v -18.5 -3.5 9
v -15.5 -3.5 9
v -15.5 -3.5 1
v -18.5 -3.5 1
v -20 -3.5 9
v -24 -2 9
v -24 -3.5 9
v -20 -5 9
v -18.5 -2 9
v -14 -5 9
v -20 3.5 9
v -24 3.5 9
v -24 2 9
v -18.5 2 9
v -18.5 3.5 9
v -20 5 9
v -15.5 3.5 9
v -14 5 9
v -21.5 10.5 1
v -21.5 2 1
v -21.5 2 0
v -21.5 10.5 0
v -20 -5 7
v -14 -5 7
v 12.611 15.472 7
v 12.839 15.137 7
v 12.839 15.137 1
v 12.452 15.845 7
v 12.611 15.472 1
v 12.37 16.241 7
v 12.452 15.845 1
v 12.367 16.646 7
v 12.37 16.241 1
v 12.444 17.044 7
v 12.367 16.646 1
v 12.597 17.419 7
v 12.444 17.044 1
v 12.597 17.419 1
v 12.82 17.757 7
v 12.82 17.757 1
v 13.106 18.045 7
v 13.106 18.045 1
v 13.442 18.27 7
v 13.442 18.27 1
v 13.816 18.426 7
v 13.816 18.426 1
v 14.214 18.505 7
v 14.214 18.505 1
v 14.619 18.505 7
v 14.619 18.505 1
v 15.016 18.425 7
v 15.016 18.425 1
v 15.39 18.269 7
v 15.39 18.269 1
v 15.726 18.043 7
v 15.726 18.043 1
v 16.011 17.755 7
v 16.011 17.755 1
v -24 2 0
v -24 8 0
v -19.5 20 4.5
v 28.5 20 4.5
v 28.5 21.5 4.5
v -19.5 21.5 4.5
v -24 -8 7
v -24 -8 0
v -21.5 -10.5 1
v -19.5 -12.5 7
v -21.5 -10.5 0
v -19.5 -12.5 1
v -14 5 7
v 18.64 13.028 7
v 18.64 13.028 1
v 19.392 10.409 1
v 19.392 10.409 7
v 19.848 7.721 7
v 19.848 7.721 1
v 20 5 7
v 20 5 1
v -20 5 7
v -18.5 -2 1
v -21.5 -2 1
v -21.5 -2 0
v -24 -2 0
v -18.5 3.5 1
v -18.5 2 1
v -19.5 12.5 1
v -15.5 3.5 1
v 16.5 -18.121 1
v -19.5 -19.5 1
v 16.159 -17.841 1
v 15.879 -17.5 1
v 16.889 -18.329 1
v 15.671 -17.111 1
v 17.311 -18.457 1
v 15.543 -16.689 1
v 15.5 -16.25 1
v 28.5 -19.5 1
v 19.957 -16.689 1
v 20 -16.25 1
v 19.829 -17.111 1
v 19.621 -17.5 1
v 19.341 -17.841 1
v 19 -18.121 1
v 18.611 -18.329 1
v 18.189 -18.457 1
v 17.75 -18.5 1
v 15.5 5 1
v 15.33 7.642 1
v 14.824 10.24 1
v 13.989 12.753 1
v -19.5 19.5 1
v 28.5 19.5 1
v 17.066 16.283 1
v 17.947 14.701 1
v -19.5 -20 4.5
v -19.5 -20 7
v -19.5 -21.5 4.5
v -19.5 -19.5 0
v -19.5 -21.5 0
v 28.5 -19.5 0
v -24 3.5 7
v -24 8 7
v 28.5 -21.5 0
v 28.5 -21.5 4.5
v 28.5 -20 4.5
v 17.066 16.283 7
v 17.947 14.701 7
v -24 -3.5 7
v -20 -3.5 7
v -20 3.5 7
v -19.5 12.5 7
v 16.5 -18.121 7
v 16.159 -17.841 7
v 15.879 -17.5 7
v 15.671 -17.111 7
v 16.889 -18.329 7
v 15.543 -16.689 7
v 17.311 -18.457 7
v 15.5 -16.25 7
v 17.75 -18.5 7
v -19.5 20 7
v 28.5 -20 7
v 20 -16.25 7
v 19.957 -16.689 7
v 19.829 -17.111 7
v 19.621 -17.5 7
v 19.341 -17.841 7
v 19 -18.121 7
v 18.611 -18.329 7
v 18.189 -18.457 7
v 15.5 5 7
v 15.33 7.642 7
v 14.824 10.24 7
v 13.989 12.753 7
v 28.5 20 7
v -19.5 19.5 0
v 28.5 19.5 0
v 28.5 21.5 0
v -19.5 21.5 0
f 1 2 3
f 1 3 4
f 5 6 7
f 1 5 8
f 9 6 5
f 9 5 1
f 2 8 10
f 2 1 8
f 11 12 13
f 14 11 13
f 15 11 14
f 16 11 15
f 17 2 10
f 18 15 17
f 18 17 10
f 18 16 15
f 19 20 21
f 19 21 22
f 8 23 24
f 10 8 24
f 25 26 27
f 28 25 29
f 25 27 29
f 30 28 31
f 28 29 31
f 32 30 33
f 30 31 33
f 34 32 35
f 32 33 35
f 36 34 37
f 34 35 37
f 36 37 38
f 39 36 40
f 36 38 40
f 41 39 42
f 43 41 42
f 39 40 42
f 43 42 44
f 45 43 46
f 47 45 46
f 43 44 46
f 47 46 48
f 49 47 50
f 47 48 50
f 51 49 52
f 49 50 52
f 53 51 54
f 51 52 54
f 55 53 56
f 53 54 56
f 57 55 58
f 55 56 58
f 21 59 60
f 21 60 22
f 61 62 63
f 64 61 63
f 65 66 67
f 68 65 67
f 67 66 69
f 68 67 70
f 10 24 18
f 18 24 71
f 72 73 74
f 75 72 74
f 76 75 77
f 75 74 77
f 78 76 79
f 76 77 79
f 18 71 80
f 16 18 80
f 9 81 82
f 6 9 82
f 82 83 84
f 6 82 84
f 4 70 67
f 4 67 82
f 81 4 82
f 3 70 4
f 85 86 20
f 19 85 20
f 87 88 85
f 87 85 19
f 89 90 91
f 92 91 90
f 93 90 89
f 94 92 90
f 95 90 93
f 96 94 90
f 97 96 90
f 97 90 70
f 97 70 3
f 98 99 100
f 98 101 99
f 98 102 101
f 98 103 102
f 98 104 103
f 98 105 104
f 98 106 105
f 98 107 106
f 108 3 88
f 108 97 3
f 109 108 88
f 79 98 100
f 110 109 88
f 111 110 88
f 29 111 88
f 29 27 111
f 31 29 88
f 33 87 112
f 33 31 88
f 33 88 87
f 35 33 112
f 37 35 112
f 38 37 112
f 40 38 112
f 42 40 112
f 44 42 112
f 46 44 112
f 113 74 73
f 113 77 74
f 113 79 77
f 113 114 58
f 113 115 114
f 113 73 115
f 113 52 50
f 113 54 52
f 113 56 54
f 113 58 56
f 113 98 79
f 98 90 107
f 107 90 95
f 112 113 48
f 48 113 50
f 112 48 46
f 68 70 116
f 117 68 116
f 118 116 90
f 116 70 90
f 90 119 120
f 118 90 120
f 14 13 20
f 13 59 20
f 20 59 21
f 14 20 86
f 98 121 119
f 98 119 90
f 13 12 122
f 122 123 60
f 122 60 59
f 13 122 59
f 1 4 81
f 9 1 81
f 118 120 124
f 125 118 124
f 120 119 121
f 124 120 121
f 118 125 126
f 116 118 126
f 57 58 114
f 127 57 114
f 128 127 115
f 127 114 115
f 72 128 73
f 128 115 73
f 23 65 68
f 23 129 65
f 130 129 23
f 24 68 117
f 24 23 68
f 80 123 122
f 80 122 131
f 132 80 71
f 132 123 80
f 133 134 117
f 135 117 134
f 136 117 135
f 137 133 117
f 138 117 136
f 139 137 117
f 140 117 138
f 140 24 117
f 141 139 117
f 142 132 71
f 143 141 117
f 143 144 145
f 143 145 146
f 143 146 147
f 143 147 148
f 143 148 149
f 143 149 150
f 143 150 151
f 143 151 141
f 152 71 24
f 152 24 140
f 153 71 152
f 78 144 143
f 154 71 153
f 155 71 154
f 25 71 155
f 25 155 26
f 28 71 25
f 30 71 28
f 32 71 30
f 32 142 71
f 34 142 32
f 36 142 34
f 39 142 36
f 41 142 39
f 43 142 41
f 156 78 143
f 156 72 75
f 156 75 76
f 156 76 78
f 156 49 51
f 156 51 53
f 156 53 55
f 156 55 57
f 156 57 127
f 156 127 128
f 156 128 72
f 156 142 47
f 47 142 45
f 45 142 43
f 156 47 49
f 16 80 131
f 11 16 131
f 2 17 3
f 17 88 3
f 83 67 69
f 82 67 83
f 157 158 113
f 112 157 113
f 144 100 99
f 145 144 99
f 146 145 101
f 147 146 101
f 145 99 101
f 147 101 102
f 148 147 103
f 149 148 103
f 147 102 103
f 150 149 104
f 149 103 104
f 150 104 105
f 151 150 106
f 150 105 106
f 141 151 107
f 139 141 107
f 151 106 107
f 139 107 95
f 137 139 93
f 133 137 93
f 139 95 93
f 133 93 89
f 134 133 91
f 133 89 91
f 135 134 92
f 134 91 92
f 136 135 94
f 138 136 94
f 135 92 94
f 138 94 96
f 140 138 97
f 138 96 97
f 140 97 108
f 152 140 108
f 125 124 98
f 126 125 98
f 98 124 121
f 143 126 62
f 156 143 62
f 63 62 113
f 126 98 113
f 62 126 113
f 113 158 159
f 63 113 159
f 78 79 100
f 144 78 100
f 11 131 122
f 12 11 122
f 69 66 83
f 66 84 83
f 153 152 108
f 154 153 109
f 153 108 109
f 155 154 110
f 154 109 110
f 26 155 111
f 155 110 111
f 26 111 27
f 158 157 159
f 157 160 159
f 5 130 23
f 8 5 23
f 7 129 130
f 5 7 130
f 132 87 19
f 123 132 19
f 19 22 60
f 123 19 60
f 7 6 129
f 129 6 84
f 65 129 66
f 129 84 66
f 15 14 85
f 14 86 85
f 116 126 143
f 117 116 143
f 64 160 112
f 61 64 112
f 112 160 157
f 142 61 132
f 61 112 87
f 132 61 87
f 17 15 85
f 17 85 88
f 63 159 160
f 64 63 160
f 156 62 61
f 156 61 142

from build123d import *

# Parameters (mm, degrees)
F1_DEPTH = 7
F2_W     = 39
F2_H     = 1
F3_DEPTH = 50
F5_DEPTH = 2
F6_W     = 1.5
F6_H     = 2.5
F7_DEPTH = 50


with BuildPart() as f1:
    # F0 (on Top) → F1 (new body)
    with BuildSketch(Plane.XY):
        Polygon((-19.5, -21.5), (28.5, -21.5), (28.5, 21.5), (-19.5, 21.5), (-19.5, 12.5), (-24, 8), (-24, 2), (-18.5, 2), (-18.5, 3.5), (-15.5, 3.5), (-15.5, 2), (-15.5, 0), (-15.5, -2), (-15.5, -3.5), (-18.5, -3.5), (-18.5, -2), (-24, -2), (-24, -8), (-19.5, -12.5), align=None)
        with BuildLine():
            Line((20, 5), (20, -14))
            Line((20, -14), (20, -16.25))
            ThreePointArc((20, -16.25), (17.75, -18.5), (15.5, -16.25))
            Line((15.5, -16.25), (15.5, -14))
            Line((15.5, -14), (15.5, 5))
            ThreePointArc((15.5, 5), (14.823785, 10.240299), (12.839445, 15.137277))
            ThreePointArc((12.839445, 15.137277), (13.105805, 18.044603), (16.010887, 17.754792))
            ThreePointArc((16.010887, 17.754792), (17.529097, 15.504906), (18.639882, 13.028395))
            ThreePointArc((18.639882, 13.028395), (19.657565, 9.071396), (20, 5))
        make_face(mode=Mode.SUBTRACT)
    extrude(amount=F1_DEPTH)

    # F2 (on face) → F3 (cut)
    with BuildSketch(Plane.YZ.offset(28.5)):
        with Locations((0, 0.5)):
            Rectangle(F2_W, F2_H)
    extrude(amount=-F3_DEPTH, mode=Mode.SUBTRACT)

    # F4 (on face) → F5 (join)
    with BuildSketch(Plane.XY.offset(7)):
        Polygon((-24, -2), (-24, -3.5), (-20, -3.5), (-20, -5), (-14, -5), (-14, 5), (-20, 5), (-20, 3.5), (-24, 3.5), (-24, 2), (-18.5, 2), (-18.5, 3.5), (-15.5, 3.5), (-15.5, -3.5), (-18.5, -3.5), (-18.5, -2), align=None)
    extrude(amount=F5_DEPTH)

    # F6 (on face) → F7 (cut)
    with BuildSketch(Plane.YZ.offset(28.5)):
        with Locations((-20.75, 5.75)):
            Rectangle(F6_W, F6_H)
        with Locations((20.75, 5.75)):
            Rectangle(F6_W, F6_H)
    extrude(amount=-F7_DEPTH, mode=Mode.SUBTRACT)


solid = f1.part
